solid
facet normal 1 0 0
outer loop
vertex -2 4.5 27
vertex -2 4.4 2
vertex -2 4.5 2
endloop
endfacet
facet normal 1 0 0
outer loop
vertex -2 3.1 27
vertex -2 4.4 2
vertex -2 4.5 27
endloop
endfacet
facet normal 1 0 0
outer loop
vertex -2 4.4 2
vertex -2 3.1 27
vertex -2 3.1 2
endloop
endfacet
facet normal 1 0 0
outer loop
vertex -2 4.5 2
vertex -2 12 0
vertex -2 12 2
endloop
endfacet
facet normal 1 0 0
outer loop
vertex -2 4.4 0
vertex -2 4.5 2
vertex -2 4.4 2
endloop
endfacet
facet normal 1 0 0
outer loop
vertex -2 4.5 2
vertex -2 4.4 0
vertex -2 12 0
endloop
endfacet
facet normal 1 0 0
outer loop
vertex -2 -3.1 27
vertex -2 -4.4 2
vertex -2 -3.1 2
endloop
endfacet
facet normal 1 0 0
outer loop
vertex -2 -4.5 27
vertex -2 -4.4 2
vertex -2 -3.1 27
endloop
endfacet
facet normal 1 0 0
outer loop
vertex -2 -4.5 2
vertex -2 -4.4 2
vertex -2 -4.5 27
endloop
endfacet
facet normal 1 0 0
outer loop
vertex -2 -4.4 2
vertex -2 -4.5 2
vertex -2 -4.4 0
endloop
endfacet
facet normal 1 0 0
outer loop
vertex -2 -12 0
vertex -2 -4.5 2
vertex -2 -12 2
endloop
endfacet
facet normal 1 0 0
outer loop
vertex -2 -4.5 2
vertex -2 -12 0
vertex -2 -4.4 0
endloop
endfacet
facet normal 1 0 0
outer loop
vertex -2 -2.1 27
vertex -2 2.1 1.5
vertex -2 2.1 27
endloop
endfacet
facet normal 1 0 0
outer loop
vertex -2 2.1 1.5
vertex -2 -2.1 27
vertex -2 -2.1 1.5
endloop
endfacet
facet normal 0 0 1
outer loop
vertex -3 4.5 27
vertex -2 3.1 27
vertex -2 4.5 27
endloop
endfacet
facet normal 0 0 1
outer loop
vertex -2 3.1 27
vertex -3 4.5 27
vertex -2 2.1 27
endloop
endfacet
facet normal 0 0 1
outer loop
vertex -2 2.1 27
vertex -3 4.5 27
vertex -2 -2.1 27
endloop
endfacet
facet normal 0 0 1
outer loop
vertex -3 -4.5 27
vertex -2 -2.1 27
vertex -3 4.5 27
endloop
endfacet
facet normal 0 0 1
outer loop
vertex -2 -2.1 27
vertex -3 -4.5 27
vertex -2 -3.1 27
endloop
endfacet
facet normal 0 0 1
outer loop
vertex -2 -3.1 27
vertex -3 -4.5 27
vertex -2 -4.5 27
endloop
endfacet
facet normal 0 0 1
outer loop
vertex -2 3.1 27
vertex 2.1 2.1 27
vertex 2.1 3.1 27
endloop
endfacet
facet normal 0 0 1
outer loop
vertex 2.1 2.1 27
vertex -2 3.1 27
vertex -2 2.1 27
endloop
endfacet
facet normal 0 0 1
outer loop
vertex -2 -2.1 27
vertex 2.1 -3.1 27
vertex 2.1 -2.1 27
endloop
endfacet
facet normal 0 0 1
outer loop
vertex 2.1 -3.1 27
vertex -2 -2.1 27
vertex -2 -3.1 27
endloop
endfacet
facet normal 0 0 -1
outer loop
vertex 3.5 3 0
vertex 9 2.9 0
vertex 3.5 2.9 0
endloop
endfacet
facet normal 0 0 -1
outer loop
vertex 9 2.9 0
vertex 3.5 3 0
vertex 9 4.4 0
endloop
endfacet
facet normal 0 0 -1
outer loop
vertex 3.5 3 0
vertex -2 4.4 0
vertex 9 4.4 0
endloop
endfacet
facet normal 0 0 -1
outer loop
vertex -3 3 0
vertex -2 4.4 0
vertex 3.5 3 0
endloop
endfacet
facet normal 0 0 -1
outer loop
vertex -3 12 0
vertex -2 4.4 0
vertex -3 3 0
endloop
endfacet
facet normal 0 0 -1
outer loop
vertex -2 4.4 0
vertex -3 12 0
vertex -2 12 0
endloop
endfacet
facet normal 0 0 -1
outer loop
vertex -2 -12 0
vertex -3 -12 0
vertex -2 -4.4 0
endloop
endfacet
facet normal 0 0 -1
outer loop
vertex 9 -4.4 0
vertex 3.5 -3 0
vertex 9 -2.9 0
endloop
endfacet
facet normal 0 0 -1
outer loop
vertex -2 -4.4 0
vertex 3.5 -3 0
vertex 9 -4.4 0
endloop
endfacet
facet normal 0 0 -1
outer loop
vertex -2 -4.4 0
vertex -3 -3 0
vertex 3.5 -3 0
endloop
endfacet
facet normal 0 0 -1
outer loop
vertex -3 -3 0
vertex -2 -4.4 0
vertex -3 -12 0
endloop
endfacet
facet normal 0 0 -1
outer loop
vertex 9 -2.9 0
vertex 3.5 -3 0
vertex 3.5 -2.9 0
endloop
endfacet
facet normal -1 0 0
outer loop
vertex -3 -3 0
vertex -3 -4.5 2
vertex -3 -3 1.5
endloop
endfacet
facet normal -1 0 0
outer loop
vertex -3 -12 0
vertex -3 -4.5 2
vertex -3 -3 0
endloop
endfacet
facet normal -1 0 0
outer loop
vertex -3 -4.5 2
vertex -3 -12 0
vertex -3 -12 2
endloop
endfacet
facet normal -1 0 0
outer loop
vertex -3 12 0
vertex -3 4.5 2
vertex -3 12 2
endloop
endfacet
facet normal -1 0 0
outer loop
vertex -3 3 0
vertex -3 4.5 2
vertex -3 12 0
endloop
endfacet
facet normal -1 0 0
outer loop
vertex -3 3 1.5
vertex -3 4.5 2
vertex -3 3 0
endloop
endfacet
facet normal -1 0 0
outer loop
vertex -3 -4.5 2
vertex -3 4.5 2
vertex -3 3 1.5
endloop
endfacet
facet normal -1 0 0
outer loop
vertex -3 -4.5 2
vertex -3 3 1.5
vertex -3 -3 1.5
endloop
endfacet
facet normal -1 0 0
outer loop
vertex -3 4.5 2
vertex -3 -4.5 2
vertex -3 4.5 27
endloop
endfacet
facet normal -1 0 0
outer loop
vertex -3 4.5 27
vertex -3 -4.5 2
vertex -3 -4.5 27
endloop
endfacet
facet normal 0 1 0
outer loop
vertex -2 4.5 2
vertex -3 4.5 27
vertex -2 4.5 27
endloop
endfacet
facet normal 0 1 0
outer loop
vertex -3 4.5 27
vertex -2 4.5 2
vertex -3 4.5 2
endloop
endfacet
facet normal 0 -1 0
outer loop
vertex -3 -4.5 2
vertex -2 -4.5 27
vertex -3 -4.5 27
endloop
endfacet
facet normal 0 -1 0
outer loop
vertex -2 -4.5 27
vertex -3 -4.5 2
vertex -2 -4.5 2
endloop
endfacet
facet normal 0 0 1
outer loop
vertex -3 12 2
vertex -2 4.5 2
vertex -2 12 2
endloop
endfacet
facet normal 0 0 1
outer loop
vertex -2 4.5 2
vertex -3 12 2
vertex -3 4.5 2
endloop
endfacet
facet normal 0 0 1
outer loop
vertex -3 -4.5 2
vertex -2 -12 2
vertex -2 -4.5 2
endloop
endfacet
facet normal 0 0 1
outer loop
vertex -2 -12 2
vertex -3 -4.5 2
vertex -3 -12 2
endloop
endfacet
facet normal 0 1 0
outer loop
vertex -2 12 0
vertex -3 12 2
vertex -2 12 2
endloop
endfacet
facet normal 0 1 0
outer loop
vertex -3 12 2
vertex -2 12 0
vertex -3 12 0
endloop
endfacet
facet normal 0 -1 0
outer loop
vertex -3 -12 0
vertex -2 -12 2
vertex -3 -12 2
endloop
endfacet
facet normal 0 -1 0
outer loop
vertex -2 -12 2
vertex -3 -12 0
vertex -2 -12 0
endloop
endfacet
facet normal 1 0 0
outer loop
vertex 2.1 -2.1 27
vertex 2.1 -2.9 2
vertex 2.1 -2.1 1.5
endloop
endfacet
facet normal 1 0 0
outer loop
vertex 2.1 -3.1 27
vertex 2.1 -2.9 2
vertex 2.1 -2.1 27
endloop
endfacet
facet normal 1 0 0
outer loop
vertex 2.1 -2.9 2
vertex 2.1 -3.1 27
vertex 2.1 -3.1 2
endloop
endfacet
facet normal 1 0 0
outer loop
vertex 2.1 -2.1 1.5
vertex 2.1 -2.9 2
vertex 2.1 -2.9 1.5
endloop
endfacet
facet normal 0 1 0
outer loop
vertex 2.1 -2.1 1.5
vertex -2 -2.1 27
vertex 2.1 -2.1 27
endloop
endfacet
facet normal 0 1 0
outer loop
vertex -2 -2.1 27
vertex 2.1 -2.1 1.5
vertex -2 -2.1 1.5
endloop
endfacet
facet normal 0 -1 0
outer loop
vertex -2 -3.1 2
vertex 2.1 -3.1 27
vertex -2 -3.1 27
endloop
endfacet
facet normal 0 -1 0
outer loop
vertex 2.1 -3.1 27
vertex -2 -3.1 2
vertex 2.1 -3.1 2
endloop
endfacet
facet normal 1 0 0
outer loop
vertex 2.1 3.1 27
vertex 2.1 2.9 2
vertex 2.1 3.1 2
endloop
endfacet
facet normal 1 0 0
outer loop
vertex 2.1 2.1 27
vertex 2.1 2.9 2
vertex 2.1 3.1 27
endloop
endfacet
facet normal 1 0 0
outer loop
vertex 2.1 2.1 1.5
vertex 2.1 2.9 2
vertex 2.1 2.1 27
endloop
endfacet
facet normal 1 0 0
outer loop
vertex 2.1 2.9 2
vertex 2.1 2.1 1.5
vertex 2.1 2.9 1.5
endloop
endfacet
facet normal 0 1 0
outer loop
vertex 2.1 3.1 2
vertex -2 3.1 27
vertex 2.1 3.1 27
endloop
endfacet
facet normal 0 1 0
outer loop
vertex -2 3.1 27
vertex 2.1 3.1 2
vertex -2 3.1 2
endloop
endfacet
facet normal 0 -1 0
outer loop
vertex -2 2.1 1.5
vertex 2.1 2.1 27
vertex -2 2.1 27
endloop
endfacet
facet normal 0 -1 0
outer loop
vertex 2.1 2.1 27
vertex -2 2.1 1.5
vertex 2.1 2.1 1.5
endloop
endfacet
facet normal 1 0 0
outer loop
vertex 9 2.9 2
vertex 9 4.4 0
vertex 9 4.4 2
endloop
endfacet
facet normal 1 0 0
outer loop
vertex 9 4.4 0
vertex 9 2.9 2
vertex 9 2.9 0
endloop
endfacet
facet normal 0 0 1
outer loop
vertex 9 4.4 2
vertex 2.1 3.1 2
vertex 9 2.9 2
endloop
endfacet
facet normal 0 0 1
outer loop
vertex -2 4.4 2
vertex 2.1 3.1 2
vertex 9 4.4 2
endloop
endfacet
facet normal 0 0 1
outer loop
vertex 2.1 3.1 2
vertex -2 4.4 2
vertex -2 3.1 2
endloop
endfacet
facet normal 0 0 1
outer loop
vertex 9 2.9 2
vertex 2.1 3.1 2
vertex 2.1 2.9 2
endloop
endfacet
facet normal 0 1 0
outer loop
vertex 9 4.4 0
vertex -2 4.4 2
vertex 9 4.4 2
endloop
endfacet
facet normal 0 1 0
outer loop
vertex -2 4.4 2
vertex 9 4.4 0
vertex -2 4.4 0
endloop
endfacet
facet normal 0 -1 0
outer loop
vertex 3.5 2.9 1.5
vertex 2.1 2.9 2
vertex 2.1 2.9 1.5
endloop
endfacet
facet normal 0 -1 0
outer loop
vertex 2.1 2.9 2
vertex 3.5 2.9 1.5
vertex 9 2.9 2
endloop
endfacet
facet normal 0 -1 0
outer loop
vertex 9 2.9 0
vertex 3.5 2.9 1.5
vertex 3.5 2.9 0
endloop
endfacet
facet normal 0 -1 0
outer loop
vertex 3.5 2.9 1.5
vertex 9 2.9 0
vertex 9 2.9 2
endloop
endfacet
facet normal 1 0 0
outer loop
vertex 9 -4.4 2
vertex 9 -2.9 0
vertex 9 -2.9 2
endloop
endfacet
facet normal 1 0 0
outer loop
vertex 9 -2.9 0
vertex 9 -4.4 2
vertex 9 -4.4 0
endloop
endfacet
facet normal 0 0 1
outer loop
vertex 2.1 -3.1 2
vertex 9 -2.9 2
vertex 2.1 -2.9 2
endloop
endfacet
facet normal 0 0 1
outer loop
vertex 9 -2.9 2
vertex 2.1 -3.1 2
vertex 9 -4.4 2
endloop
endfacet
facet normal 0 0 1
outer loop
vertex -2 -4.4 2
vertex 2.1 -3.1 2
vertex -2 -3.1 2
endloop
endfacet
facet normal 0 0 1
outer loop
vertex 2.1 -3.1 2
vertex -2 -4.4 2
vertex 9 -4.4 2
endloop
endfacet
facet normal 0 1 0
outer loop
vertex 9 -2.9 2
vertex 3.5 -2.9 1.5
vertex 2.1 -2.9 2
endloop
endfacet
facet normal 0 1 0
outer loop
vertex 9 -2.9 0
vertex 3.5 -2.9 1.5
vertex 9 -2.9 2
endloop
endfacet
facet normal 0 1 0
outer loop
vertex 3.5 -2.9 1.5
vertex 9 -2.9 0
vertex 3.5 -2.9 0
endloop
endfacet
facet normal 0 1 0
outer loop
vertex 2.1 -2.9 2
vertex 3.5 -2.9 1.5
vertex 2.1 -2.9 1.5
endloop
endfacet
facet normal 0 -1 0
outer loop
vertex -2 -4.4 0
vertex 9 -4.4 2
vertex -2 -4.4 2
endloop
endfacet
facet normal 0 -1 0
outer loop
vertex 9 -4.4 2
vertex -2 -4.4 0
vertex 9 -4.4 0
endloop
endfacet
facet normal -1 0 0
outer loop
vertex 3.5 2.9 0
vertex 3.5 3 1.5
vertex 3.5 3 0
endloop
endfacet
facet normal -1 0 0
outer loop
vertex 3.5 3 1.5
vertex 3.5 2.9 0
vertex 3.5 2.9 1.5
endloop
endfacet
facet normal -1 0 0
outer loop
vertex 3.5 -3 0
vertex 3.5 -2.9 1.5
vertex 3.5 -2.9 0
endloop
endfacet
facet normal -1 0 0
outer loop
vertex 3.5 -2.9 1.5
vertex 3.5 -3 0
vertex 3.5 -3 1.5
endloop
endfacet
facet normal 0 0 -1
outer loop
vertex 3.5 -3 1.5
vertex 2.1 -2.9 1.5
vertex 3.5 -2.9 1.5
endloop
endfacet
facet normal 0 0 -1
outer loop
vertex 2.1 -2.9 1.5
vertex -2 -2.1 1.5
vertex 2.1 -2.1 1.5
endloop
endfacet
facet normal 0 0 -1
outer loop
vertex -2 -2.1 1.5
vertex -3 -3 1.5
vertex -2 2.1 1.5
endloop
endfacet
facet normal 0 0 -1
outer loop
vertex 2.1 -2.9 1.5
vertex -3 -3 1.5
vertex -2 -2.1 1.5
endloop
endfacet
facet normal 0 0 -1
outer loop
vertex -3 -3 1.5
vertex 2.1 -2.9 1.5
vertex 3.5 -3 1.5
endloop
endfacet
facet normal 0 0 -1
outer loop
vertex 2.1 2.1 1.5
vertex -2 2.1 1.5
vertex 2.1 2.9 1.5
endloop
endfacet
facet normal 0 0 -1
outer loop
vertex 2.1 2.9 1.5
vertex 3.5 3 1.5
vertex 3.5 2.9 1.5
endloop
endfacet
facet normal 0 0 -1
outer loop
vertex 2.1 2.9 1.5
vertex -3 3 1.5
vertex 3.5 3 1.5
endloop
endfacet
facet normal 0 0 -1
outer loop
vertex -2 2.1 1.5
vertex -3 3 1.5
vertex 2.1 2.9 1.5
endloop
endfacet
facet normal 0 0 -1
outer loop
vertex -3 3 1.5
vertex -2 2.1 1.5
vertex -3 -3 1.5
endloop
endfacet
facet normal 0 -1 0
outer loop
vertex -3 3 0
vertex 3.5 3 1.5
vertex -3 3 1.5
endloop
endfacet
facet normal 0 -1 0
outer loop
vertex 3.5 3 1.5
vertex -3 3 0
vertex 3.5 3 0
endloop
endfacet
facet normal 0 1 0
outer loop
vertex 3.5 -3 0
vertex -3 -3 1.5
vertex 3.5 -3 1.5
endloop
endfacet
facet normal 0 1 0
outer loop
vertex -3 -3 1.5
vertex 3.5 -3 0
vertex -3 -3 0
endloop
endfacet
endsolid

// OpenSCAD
// file: fb_globals.scad
/// @file fb_globals.scad
///
/// @brief project footbridge globals
///
/// @author © Dave Harris 2022
///
/// Included in all project files.


$fa = 1;   // Fragment angle
$fs = 0.4; // Fragment size resolution

// global constants
//------------------

H_canopy = 47;

H_bridge = 49.5; // platform<>bridge
W_bridge = 36;   // width of bridge
                 // > walkway
W_walk   = 34.5; // width
H_walk   = 36;   // height of walkway


Steps    = 27;   // number of steps
W_stairs = 32;   // width ~ 9'6" @ H0
L_tread  = 3.5;  // tread ~ 12" @ H0
L_stairs = L_tread * (Steps +1);
H_rise   = H_bridge / (Steps +1); 
  // rise is 1.7678, not H0 1.75 (6")

W_lift   = 34;

W_build  = W_stairs +2;
L_build  = L_stairs+W_bridge+W_lift +2;

W_pillar = 4;

L_spacing = L_build /2;

Spans = 6;

L_canopy = ((Spans -1) * L_spacing) + W_pillar;

echo("len",L_canopy);

H_door   = 28;
W_door   = 18;

H_window = 6;
W_window = 16;


W_plat45  = 93.9;
W_track34 = 87.9;
W_plat23  = 93.8;
W_track12 = 87.9;

W_plat23edge =
   ( W_plat23 - W_stairs +2 ) /2 ;
W_plat45edge =
   ( W_plat45 - W_stairs +2 ) /2 ;
   
L_span34 = W_track34 + W_plat45edge + W_plat23edge;

L_span12 = 136.5;

W_grider = 2.2;

W_LEDstrip = 7.5;



// eof
// main file
/// @file fb_canopyBuildSupport.scad
///
/// @brief canopy build support
///
/// @author © Dave Harris 2022
/// 

include<fb_globals.scad>

use<fb_canopySpan2.scad>

//canopySpan2(Wplat = W_plat45 -1 );

difference()
{
  union()
  {
    translate(
      [ - (W_pillar /2) -1
      , - 4.5
      , 0  ]
    ) cube(
        [ 1
        , 9
        , H_door -1 ]
      );

   translate(
      [ - (W_pillar /2) -1
      , - 12
      , 0  ]
    ) cube(
        [ 1
        , 24
        , 2 ]
      );

    translate(
      [ - (W_pillar /2) -1
      , - (W_pillar /2) -1.1
      , 0  ]
    ) cube(
        [ 5.1
        , 1
        , H_door -1 ]
      );

    translate(
      [ - (W_pillar /2) -1
      , (W_pillar /2) +0.1
      , 0  ]
    ) cube(
        [ 5.1
        , 1
        , H_door -1 ]
      );

    translate(
      [ - (W_pillar /2) -1
      , (W_pillar /2) +0.9
      , 0  ]
    ) cube(
        [ 12
        , 1.5
        , 2 ]
      );

    translate(
      [ - (W_pillar /2) -1
      , -(W_pillar /2) -2.4
      , 0  ]
    ) cube(
        [ 12
        , 1.5
        , 2 ]
      );
  }
  cube([7, 6, 3], center=true );
  
}

// eof
